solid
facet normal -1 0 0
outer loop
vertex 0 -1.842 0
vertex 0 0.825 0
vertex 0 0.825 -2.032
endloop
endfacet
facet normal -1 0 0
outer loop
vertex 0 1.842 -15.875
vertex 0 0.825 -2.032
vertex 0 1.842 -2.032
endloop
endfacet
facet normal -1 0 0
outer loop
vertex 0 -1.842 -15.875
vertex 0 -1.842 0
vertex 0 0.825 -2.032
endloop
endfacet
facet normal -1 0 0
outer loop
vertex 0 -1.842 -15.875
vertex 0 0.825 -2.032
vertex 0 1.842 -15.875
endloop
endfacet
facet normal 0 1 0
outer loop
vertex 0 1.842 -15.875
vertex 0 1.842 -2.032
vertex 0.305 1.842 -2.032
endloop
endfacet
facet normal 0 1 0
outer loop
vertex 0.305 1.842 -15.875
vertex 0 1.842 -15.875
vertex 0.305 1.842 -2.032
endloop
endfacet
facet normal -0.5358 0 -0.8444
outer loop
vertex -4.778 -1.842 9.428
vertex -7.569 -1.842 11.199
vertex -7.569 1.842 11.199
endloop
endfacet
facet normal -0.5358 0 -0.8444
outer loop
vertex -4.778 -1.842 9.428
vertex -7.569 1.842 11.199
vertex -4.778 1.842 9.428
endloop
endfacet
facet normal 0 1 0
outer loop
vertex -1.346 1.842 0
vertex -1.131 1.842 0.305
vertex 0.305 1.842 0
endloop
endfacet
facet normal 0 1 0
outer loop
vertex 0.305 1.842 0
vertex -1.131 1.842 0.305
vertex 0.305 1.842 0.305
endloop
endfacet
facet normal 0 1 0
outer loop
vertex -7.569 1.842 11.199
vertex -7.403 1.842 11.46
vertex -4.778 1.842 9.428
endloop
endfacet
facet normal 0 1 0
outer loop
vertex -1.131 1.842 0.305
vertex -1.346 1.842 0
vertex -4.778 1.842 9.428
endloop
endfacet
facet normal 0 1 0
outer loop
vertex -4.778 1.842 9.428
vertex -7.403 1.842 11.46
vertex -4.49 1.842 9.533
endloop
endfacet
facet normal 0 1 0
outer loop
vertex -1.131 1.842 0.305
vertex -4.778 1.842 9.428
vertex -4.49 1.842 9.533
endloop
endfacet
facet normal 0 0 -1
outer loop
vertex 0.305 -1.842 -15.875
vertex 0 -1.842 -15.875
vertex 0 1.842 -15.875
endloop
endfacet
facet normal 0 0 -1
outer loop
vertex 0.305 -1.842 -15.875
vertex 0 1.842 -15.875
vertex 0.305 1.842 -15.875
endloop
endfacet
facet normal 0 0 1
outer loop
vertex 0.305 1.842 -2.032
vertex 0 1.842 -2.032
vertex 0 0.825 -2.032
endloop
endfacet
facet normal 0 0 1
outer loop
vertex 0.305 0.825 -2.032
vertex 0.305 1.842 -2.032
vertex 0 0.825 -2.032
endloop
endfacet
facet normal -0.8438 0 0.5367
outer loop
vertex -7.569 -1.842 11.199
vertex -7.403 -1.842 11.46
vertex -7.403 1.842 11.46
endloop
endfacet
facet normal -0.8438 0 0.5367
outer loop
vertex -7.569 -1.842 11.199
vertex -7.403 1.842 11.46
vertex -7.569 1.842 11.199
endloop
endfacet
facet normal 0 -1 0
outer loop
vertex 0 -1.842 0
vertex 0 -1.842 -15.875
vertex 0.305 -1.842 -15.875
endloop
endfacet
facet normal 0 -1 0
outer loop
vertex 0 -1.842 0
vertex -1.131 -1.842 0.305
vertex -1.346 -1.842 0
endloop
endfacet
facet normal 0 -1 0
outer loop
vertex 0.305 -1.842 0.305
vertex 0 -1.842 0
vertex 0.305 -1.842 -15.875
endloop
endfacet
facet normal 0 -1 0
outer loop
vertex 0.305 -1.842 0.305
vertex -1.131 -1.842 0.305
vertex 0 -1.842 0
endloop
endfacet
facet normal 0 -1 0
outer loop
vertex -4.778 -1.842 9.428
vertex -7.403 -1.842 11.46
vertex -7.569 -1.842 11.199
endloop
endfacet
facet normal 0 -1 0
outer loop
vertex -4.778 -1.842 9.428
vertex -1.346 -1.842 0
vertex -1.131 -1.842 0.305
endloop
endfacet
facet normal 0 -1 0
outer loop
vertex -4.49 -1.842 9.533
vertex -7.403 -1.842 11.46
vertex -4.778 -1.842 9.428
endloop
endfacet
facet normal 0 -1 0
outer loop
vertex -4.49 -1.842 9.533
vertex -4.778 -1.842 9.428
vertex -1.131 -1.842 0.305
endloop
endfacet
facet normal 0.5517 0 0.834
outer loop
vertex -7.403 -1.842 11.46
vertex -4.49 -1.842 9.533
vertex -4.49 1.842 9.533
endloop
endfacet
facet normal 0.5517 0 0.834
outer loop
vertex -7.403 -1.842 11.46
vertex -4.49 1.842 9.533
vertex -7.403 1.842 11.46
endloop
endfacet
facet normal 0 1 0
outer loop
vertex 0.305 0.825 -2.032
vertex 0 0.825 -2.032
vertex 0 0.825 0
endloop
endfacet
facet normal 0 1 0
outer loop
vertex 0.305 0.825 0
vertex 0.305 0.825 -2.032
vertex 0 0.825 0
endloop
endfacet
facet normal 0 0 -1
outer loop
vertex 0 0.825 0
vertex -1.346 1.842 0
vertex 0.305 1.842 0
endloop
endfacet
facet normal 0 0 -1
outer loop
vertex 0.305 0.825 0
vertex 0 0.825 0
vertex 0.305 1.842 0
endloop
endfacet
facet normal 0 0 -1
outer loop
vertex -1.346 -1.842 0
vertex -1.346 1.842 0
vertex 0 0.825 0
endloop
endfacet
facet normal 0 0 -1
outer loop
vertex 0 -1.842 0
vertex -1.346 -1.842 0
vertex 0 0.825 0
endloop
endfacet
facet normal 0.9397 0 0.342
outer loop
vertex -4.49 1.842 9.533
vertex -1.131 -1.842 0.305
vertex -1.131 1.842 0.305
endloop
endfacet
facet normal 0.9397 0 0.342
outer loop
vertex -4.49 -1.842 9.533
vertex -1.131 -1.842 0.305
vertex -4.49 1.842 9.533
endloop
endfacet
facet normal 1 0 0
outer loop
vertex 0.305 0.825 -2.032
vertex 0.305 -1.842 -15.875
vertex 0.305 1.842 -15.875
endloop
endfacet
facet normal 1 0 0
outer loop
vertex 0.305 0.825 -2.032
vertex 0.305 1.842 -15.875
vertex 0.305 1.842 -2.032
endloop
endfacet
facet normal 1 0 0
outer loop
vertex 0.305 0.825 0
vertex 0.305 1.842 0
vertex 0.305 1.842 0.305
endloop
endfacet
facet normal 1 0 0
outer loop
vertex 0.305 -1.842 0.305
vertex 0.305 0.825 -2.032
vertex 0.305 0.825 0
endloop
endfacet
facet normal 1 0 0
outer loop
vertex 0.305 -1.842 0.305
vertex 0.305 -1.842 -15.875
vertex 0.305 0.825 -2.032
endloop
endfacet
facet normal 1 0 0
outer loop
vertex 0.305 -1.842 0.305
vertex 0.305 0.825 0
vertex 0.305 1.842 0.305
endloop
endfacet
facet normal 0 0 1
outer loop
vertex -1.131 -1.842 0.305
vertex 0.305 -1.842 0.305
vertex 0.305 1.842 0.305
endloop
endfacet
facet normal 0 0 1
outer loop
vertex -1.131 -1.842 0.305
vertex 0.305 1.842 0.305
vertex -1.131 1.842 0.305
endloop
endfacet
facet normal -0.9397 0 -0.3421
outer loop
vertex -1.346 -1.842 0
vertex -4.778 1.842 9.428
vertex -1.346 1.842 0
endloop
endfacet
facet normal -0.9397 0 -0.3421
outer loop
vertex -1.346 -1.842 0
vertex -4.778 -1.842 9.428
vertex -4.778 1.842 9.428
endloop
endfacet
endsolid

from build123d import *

# Parameters (mm, degrees)
F1_DEPTH = 1.8415
F2_W     = 1.016
F2_H     = 2.032
F3_DEPTH = 25.4


with BuildPart() as f1:
    # F0 (on Front) → F1 (new body, symmetric)
    with BuildSketch(Plane.XZ):
        Polygon((0, 0), (0, -15.875), (0.3048, -15.875), (0.3048, 0), (0.3048, 0.3048), (-1.131116, 0.3048), (-4.489804, 9.532717), (-7.403488, 11.460087), (-7.569124, 11.199027), (-4.777688, 9.427936), (-1.3462, 0), align=None)
    extrude(amount=F1_DEPTH, both=True)

    # F2 (on face) → F3 (cut)
    with BuildSketch(Plane(origin=(0, 0, 0), x_dir=(0, -1, 0), z_dir=(-1, 0, 0))):
        with Locations((-1.3335, -1.016)):
            Rectangle(F2_W, F2_H)
    extrude(amount=-F3_DEPTH, mode=Mode.SUBTRACT)


solid = f1.part
